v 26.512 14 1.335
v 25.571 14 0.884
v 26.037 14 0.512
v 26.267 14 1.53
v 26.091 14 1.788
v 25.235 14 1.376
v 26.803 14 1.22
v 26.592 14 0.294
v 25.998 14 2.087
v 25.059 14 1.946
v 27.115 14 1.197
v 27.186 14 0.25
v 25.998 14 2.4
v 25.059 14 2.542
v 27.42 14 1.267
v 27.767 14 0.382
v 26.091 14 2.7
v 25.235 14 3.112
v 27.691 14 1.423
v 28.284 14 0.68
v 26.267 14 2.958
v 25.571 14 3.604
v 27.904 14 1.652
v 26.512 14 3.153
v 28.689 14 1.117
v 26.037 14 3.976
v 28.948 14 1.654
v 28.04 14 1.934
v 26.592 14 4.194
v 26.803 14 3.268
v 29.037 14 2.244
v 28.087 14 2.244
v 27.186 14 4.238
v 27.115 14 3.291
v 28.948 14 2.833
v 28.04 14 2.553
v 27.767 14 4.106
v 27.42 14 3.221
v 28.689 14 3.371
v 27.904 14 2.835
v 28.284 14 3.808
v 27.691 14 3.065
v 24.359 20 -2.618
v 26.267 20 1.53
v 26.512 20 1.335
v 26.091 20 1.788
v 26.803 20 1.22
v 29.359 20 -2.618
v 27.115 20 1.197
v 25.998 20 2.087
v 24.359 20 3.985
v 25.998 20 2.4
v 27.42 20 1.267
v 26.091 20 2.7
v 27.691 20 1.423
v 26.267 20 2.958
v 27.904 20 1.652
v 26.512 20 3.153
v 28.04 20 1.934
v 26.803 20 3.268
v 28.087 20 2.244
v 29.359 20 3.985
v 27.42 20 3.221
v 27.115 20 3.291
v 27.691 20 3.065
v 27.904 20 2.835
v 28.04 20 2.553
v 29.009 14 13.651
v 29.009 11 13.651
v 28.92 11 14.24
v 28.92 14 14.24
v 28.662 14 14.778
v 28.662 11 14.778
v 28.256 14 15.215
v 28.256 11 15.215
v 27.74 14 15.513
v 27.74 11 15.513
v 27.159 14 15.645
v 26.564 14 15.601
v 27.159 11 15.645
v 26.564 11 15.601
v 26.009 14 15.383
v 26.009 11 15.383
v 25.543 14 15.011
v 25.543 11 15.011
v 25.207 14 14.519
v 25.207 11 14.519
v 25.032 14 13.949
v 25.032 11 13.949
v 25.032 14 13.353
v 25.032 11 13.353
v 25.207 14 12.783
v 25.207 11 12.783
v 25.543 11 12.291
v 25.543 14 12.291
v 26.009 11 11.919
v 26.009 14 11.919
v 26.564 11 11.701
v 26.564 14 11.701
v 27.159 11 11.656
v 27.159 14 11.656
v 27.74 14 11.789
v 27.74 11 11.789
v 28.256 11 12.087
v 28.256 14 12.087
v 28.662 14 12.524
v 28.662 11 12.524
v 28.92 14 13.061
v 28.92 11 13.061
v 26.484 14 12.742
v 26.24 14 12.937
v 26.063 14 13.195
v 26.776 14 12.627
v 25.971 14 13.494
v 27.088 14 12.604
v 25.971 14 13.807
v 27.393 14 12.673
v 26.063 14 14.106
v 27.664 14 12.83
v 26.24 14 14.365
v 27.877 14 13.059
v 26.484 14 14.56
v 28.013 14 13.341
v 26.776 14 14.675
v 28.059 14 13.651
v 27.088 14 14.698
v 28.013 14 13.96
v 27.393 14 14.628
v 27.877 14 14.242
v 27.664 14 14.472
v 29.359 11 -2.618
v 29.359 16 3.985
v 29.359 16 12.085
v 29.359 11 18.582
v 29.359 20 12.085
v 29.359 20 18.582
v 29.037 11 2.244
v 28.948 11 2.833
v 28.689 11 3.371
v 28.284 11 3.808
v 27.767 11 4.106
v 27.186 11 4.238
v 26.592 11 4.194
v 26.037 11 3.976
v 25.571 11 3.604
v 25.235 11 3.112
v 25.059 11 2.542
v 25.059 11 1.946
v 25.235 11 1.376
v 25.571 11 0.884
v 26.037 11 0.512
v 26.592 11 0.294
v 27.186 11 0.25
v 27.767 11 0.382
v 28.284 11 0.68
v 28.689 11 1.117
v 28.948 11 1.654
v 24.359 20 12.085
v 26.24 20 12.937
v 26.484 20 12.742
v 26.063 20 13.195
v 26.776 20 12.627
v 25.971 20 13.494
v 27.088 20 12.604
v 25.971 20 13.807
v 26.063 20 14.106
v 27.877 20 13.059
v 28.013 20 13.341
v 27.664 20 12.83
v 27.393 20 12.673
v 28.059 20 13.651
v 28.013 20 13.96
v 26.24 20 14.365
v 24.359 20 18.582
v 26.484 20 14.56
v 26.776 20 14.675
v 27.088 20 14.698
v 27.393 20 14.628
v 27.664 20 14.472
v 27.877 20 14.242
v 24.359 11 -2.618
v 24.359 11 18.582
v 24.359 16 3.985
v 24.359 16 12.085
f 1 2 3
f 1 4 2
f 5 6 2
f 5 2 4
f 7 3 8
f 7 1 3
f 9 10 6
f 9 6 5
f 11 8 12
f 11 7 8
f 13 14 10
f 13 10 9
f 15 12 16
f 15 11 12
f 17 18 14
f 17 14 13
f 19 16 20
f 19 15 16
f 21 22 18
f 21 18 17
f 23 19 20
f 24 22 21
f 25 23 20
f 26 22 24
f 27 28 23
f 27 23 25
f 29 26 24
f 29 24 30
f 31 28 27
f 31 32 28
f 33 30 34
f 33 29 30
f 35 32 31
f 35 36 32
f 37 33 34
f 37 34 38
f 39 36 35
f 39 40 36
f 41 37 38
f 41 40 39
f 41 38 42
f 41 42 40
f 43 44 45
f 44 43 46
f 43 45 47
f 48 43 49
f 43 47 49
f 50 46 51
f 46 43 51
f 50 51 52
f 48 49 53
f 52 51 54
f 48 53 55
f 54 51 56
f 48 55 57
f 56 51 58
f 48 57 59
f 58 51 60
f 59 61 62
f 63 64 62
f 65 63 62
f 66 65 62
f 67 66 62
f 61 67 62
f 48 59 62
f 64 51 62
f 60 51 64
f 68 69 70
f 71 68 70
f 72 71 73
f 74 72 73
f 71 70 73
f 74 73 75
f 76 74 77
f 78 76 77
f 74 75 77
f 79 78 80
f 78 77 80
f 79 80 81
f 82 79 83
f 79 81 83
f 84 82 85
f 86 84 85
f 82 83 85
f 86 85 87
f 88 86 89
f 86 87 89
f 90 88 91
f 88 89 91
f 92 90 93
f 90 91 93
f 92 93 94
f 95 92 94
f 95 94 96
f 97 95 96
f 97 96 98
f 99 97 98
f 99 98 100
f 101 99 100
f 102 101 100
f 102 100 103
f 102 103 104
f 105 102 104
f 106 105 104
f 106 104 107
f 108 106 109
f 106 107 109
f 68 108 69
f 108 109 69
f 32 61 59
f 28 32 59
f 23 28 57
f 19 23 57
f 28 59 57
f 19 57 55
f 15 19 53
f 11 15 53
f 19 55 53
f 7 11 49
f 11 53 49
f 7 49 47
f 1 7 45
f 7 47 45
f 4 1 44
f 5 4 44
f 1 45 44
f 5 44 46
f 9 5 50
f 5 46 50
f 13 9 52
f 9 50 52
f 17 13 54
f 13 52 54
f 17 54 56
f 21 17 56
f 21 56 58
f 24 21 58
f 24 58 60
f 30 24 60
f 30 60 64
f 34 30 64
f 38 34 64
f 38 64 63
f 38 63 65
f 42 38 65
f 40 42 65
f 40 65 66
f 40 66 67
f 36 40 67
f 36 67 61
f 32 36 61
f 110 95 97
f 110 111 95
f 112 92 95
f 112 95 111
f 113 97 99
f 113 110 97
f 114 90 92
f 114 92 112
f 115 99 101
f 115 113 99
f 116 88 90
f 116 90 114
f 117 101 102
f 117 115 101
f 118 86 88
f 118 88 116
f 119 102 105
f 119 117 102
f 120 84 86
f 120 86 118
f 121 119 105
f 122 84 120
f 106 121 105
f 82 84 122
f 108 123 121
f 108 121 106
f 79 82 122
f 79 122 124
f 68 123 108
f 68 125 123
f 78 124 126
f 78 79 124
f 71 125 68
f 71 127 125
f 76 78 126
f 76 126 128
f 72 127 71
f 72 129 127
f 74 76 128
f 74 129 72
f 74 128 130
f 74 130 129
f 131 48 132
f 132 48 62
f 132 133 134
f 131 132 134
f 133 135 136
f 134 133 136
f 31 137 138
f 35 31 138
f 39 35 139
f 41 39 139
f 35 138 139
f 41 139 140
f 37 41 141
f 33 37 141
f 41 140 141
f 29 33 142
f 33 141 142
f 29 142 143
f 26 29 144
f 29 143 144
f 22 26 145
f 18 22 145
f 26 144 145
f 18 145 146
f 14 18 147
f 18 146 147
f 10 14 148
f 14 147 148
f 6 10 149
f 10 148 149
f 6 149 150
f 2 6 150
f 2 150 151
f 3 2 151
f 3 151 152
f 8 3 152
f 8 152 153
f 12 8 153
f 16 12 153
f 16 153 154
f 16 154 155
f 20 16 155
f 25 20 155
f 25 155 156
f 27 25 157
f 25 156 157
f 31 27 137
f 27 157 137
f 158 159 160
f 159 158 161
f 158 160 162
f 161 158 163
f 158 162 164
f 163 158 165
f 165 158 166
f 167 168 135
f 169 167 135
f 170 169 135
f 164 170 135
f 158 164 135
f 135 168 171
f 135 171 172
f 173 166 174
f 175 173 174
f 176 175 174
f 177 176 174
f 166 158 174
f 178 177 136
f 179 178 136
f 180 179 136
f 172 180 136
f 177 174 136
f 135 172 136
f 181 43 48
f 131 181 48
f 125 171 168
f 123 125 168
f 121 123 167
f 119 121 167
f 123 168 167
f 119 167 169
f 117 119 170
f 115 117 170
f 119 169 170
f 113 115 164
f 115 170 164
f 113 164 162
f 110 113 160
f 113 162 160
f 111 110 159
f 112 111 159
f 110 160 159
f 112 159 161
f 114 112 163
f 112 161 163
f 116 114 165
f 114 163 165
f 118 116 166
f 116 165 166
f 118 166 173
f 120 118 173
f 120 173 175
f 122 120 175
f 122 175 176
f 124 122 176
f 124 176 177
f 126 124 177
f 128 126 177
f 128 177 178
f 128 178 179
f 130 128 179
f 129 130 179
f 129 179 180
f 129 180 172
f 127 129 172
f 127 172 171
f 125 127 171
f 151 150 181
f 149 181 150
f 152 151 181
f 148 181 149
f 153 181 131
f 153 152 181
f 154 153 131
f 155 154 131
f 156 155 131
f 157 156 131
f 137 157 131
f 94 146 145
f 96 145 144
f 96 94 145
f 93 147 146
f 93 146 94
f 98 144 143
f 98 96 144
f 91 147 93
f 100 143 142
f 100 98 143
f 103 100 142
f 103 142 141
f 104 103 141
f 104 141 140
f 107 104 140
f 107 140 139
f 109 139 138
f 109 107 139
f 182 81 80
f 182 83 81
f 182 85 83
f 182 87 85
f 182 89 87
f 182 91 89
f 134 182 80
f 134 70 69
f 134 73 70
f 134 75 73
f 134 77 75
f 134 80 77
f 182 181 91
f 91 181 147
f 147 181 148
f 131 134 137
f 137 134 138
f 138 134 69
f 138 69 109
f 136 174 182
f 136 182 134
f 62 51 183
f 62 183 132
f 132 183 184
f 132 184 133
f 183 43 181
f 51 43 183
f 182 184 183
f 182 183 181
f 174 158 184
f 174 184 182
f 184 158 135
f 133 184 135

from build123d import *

# Parameters (mm, degrees)
SKETCH020_W     = 5
SKETCH020_H     = 21.2
PAD010_DEPTH    = 9
SKETCH023_W     = 6.65
SKETCH023_H     = 8.1
POCKET011_DEPTH = 4
SKETCH024_R     = 1.05
POCKET012_DEPTH = 10
SKETCH025_R     = 2
POCKET013_DEPTH = 3


with BuildPart() as part:
    # Sketch020 → Pad010 (new body)
    with BuildSketch(Plane.XZ):
        with Locations((26.859407, 7.981561)):
            Rectangle(SKETCH020_W, SKETCH020_H)
    extrude(amount=PAD010_DEPTH)

    # Sketch023 (on Face5 of Pad010) → Pocket011 (cut)
    with BuildSketch(Plane(origin=(0, 0, 0), x_dir=(1, 0, 0), z_dir=(0, 1, 0))):
        with Locations((27.211889, -8.03451)):
            Rectangle(SKETCH023_W, SKETCH023_H)
    extrude(amount=-POCKET011_DEPTH, mode=Mode.SUBTRACT)

    # Sketch024 (on Face2 of Pocket011) → Pocket012 (cut)
    with BuildSketch(Plane(origin=(0, 0, 0), x_dir=(1, 0, 0), z_dir=(0, 1, 0))):
        with Locations((27.009228, -13.650866)):
            Circle(SKETCH024_R)
        with Locations((27.036736, -2.243972)):
            Circle(SKETCH024_R)
    extrude(amount=-POCKET012_DEPTH, mode=Mode.SUBTRACT)

    # Sketch025 (on Face8 of Pocket012) → Pocket013 (cut)
    with BuildSketch(Plane.XZ.offset(9)):
        with Locations((27.009228, 13.650866)):
            Circle(SKETCH025_R)
        with Locations((27.036736, 2.243972)):
            Circle(SKETCH025_R)
    extrude(amount=-POCKET013_DEPTH, mode=Mode.SUBTRACT)


with BuildPart() as part_1:
    # Body005 placement: moved
    add(part.part.moved(Location((0, 20, 0))))


solid = part_1.part
